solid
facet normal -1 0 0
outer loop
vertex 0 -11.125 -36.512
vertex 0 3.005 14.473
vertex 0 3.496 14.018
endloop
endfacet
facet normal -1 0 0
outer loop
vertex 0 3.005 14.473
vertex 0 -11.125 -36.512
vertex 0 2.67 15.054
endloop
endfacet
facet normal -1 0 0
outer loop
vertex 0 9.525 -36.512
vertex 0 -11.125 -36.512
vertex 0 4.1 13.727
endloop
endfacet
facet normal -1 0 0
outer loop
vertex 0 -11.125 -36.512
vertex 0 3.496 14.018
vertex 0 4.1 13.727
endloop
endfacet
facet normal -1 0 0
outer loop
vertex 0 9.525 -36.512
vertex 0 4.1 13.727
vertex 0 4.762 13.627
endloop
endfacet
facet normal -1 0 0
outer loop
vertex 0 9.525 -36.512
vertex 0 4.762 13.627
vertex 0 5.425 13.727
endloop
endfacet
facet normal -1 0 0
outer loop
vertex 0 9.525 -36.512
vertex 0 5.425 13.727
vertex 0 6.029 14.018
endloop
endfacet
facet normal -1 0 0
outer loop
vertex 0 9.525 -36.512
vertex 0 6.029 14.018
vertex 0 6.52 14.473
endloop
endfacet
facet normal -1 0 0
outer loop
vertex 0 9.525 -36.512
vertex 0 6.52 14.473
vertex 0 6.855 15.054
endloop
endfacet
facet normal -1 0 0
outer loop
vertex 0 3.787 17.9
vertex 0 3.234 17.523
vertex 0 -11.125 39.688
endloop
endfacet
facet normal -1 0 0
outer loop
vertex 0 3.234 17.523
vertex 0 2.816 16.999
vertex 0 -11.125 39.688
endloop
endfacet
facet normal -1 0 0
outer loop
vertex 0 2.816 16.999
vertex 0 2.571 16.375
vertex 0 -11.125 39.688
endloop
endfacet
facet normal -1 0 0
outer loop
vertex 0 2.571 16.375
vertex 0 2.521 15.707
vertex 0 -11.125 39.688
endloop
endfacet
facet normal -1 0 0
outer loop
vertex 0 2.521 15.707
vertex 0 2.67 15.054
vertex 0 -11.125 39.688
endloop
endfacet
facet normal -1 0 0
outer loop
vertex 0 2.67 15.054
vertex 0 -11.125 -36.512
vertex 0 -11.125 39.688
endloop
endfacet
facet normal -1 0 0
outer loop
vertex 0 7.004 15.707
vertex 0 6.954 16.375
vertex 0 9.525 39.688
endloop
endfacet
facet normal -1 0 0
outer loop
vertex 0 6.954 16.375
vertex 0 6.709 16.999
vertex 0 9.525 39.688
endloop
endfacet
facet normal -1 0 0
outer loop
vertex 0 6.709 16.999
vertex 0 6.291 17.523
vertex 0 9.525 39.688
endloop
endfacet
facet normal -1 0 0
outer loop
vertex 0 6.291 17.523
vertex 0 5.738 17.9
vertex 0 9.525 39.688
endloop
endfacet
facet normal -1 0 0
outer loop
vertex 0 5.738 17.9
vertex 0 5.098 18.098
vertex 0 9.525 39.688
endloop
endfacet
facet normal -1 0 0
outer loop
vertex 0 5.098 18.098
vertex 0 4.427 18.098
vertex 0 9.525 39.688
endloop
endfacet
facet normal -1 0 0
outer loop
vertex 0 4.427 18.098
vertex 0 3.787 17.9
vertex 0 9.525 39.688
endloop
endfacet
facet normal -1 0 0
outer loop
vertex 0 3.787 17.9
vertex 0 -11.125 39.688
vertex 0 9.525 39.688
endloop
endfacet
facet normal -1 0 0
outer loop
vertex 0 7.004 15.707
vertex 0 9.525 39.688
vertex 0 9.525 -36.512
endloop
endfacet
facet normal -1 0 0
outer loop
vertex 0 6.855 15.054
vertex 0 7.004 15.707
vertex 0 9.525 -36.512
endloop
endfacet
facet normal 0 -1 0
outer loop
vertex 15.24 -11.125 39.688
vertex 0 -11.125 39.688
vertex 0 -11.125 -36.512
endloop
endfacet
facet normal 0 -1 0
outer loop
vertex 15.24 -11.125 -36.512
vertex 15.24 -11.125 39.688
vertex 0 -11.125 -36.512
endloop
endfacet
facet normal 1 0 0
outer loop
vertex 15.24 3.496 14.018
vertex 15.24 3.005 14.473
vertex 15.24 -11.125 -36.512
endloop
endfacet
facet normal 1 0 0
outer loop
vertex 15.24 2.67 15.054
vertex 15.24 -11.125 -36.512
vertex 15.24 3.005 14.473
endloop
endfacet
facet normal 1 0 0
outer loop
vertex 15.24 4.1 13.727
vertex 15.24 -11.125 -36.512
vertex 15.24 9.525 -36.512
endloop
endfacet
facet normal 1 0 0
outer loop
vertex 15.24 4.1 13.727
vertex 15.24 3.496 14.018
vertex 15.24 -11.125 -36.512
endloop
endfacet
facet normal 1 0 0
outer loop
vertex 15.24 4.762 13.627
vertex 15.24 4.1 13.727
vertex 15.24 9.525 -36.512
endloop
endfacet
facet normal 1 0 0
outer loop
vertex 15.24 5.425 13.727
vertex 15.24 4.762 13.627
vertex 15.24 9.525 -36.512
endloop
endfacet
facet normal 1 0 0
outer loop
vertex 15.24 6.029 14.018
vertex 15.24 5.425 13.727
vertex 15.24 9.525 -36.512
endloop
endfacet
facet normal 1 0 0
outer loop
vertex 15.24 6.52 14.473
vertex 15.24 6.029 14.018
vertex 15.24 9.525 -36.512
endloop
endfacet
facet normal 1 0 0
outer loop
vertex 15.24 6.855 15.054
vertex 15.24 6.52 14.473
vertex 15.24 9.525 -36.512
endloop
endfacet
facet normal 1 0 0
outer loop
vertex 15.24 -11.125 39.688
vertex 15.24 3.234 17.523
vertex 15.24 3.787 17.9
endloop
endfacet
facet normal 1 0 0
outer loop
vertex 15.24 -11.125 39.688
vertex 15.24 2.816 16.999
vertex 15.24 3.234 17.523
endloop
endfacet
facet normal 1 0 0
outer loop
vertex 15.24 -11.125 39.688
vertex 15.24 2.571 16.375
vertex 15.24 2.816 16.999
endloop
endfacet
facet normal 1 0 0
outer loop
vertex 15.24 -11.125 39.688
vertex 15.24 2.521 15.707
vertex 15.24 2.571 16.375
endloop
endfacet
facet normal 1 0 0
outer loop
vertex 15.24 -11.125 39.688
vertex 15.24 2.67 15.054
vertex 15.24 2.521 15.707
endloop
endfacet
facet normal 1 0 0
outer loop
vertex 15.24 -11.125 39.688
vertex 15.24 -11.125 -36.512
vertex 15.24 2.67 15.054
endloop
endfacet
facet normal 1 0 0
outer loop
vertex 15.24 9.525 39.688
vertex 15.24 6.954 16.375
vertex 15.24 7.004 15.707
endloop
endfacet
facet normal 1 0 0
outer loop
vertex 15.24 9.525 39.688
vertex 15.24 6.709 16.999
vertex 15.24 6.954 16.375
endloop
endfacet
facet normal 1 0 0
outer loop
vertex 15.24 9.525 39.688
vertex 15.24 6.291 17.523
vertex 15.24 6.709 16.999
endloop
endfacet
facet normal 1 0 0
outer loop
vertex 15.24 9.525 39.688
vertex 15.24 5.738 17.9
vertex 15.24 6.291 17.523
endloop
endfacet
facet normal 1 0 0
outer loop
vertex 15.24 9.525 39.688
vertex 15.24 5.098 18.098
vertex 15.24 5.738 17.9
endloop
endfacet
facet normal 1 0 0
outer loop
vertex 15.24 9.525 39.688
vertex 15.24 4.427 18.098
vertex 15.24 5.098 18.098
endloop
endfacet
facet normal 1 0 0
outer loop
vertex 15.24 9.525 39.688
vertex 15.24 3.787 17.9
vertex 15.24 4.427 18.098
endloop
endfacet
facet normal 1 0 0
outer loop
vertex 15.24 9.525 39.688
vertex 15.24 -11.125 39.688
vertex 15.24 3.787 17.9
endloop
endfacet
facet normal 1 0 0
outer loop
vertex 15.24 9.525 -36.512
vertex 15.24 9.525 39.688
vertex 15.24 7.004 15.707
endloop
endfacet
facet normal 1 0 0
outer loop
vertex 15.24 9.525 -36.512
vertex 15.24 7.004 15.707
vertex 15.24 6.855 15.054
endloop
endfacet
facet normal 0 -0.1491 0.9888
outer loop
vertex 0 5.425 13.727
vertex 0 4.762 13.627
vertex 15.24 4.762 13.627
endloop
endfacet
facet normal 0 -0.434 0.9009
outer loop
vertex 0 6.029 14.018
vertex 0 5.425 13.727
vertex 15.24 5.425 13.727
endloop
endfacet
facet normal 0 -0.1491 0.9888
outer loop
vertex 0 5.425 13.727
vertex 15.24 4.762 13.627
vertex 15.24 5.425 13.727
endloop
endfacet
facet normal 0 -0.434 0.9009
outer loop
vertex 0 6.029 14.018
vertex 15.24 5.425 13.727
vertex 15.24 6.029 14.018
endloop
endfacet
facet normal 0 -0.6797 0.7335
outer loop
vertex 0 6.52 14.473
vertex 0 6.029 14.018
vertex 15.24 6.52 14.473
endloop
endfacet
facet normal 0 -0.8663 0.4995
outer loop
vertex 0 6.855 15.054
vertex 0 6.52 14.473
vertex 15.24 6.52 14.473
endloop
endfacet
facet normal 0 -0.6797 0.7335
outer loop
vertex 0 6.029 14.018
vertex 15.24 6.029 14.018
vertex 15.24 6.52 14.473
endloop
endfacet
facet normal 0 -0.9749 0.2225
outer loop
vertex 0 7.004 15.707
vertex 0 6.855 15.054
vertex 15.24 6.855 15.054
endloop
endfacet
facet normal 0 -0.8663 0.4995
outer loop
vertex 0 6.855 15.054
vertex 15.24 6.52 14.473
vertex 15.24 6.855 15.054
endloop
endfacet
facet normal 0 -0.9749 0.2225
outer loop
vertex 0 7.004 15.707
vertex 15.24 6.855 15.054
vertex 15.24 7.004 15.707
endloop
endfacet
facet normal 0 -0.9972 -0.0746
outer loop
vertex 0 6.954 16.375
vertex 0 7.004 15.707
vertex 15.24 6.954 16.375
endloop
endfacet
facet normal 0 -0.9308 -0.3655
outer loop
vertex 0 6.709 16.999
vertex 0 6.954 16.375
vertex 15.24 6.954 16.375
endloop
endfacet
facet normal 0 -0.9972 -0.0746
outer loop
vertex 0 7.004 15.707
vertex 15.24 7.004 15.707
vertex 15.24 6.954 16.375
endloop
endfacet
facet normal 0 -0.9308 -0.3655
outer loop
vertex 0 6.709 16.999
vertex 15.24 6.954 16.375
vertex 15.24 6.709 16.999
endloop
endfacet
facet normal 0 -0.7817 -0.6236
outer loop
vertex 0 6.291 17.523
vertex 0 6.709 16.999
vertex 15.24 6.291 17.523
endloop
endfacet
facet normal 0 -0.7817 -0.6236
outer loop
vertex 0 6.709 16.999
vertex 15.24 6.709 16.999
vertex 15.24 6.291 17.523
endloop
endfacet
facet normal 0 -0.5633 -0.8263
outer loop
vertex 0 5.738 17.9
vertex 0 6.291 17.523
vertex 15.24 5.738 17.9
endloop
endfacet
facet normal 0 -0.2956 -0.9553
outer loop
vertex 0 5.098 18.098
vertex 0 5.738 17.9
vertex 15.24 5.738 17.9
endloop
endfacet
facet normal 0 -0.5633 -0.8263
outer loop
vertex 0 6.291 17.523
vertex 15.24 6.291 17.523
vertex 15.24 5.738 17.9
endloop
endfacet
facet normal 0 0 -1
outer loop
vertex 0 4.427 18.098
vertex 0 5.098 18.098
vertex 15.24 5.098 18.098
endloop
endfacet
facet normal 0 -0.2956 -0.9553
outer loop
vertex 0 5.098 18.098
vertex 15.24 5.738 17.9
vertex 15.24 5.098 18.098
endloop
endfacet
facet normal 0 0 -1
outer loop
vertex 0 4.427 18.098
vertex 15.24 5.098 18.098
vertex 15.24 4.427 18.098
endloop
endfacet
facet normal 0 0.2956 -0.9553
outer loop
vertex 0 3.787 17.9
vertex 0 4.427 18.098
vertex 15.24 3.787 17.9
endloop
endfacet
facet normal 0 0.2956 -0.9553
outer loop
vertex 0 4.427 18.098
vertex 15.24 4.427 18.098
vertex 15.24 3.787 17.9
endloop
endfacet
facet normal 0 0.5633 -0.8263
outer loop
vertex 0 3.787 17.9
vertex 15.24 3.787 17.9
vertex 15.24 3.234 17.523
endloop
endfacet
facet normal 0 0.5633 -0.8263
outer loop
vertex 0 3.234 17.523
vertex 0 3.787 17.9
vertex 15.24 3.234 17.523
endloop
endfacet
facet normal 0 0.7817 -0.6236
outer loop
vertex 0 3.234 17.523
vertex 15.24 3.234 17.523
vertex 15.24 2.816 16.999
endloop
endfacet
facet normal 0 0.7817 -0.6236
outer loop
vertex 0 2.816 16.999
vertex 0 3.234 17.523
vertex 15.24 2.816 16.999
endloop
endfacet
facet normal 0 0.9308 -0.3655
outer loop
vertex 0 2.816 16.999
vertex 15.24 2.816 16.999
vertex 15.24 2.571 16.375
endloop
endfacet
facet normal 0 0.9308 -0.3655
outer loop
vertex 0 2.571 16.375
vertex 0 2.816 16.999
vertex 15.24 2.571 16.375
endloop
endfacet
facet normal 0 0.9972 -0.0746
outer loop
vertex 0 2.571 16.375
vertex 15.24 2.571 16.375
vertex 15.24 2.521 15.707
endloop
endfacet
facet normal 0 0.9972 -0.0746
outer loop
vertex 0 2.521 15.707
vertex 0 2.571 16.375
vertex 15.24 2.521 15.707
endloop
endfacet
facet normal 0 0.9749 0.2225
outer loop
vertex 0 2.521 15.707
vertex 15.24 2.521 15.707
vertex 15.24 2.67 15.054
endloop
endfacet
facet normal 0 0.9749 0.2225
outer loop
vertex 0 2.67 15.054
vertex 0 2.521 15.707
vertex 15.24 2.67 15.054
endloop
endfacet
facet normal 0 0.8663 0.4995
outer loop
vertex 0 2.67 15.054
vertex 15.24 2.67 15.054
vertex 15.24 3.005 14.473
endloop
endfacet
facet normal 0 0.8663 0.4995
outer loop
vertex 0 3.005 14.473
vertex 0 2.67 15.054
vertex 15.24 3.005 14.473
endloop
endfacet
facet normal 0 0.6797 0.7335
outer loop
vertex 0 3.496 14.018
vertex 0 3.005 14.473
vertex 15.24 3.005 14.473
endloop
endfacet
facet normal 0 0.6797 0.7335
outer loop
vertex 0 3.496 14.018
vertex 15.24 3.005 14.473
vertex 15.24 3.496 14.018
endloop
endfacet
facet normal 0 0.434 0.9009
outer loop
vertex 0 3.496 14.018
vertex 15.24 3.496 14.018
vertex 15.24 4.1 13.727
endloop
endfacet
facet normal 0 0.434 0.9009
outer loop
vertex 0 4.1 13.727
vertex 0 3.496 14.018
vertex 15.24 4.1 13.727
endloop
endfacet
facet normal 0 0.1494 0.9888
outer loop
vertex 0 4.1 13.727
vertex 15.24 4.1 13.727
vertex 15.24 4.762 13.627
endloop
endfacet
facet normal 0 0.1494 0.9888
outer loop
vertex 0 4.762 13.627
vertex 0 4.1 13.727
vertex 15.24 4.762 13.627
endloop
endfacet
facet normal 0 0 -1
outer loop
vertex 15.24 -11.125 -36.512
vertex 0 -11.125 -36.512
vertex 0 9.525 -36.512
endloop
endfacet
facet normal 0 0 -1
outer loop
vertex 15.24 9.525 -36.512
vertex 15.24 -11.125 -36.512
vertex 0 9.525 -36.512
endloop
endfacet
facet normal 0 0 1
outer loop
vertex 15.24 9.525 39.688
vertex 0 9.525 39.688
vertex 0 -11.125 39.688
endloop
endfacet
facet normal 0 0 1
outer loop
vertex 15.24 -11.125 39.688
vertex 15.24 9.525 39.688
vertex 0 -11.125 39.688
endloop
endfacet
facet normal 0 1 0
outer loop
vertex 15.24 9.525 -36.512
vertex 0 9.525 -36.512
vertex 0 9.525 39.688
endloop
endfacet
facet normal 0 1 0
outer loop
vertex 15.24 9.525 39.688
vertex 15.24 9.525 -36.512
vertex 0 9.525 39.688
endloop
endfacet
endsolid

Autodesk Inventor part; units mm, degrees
ref_plane "YZ Plane" through (0, 0, 0) normal (1, 0, 0) x (0, 1, 0)
ref_plane "XZ Plane" through (0, 0, 0) normal (0, 1, 0) x (-1, 0, 0)
ref_plane "XY Plane" through (0, 0, 0) normal (0, 0, 1) x (1, 0, 0)
sketch "Sketch1" plane through (0, 0, 0) normal (1, 0, 0) x (0, 1, 0)
  point P0 (0, 0)
sketch "Sketch2" plane through (0, 0, 0) normal (1, 0, 0) x (0, 1, 0)
  line L0 (9.525, 39.6875) -> (-11.1252, 39.6875)
  line L1 (-11.1252, 39.6875) -> (-11.1252, -36.5125)
  line L2 (-11.1252, -36.5125) -> (9.525, -36.5125)
  line L3 (9.525, -36.5125) -> (9.525, 39.6875)
  line L4 (9.525, -22.225) -> (9.525, -36.5125)
  point P0 (0, 0)
  dimension "d0" = 20.6502
  dimension "d1" = 76.2
extrude "Extrusion1" add sketch "Sketch2" along normal blind 15.24
sketch "Sketch3" plane through (15.24, 0, 0) normal (1, 0, 0) x (0, 0, -1)
  circle A0 centre (-15.875, 4.7625) radius 2.2479
  point P0 (0, 0)
  dimension "d4" = 4.4958
extrude "Extrusion2" cut sketch "Sketch3" along normal mid plane 50.8
properties part number "SLIDERCRANK-BASE CUBOID"
